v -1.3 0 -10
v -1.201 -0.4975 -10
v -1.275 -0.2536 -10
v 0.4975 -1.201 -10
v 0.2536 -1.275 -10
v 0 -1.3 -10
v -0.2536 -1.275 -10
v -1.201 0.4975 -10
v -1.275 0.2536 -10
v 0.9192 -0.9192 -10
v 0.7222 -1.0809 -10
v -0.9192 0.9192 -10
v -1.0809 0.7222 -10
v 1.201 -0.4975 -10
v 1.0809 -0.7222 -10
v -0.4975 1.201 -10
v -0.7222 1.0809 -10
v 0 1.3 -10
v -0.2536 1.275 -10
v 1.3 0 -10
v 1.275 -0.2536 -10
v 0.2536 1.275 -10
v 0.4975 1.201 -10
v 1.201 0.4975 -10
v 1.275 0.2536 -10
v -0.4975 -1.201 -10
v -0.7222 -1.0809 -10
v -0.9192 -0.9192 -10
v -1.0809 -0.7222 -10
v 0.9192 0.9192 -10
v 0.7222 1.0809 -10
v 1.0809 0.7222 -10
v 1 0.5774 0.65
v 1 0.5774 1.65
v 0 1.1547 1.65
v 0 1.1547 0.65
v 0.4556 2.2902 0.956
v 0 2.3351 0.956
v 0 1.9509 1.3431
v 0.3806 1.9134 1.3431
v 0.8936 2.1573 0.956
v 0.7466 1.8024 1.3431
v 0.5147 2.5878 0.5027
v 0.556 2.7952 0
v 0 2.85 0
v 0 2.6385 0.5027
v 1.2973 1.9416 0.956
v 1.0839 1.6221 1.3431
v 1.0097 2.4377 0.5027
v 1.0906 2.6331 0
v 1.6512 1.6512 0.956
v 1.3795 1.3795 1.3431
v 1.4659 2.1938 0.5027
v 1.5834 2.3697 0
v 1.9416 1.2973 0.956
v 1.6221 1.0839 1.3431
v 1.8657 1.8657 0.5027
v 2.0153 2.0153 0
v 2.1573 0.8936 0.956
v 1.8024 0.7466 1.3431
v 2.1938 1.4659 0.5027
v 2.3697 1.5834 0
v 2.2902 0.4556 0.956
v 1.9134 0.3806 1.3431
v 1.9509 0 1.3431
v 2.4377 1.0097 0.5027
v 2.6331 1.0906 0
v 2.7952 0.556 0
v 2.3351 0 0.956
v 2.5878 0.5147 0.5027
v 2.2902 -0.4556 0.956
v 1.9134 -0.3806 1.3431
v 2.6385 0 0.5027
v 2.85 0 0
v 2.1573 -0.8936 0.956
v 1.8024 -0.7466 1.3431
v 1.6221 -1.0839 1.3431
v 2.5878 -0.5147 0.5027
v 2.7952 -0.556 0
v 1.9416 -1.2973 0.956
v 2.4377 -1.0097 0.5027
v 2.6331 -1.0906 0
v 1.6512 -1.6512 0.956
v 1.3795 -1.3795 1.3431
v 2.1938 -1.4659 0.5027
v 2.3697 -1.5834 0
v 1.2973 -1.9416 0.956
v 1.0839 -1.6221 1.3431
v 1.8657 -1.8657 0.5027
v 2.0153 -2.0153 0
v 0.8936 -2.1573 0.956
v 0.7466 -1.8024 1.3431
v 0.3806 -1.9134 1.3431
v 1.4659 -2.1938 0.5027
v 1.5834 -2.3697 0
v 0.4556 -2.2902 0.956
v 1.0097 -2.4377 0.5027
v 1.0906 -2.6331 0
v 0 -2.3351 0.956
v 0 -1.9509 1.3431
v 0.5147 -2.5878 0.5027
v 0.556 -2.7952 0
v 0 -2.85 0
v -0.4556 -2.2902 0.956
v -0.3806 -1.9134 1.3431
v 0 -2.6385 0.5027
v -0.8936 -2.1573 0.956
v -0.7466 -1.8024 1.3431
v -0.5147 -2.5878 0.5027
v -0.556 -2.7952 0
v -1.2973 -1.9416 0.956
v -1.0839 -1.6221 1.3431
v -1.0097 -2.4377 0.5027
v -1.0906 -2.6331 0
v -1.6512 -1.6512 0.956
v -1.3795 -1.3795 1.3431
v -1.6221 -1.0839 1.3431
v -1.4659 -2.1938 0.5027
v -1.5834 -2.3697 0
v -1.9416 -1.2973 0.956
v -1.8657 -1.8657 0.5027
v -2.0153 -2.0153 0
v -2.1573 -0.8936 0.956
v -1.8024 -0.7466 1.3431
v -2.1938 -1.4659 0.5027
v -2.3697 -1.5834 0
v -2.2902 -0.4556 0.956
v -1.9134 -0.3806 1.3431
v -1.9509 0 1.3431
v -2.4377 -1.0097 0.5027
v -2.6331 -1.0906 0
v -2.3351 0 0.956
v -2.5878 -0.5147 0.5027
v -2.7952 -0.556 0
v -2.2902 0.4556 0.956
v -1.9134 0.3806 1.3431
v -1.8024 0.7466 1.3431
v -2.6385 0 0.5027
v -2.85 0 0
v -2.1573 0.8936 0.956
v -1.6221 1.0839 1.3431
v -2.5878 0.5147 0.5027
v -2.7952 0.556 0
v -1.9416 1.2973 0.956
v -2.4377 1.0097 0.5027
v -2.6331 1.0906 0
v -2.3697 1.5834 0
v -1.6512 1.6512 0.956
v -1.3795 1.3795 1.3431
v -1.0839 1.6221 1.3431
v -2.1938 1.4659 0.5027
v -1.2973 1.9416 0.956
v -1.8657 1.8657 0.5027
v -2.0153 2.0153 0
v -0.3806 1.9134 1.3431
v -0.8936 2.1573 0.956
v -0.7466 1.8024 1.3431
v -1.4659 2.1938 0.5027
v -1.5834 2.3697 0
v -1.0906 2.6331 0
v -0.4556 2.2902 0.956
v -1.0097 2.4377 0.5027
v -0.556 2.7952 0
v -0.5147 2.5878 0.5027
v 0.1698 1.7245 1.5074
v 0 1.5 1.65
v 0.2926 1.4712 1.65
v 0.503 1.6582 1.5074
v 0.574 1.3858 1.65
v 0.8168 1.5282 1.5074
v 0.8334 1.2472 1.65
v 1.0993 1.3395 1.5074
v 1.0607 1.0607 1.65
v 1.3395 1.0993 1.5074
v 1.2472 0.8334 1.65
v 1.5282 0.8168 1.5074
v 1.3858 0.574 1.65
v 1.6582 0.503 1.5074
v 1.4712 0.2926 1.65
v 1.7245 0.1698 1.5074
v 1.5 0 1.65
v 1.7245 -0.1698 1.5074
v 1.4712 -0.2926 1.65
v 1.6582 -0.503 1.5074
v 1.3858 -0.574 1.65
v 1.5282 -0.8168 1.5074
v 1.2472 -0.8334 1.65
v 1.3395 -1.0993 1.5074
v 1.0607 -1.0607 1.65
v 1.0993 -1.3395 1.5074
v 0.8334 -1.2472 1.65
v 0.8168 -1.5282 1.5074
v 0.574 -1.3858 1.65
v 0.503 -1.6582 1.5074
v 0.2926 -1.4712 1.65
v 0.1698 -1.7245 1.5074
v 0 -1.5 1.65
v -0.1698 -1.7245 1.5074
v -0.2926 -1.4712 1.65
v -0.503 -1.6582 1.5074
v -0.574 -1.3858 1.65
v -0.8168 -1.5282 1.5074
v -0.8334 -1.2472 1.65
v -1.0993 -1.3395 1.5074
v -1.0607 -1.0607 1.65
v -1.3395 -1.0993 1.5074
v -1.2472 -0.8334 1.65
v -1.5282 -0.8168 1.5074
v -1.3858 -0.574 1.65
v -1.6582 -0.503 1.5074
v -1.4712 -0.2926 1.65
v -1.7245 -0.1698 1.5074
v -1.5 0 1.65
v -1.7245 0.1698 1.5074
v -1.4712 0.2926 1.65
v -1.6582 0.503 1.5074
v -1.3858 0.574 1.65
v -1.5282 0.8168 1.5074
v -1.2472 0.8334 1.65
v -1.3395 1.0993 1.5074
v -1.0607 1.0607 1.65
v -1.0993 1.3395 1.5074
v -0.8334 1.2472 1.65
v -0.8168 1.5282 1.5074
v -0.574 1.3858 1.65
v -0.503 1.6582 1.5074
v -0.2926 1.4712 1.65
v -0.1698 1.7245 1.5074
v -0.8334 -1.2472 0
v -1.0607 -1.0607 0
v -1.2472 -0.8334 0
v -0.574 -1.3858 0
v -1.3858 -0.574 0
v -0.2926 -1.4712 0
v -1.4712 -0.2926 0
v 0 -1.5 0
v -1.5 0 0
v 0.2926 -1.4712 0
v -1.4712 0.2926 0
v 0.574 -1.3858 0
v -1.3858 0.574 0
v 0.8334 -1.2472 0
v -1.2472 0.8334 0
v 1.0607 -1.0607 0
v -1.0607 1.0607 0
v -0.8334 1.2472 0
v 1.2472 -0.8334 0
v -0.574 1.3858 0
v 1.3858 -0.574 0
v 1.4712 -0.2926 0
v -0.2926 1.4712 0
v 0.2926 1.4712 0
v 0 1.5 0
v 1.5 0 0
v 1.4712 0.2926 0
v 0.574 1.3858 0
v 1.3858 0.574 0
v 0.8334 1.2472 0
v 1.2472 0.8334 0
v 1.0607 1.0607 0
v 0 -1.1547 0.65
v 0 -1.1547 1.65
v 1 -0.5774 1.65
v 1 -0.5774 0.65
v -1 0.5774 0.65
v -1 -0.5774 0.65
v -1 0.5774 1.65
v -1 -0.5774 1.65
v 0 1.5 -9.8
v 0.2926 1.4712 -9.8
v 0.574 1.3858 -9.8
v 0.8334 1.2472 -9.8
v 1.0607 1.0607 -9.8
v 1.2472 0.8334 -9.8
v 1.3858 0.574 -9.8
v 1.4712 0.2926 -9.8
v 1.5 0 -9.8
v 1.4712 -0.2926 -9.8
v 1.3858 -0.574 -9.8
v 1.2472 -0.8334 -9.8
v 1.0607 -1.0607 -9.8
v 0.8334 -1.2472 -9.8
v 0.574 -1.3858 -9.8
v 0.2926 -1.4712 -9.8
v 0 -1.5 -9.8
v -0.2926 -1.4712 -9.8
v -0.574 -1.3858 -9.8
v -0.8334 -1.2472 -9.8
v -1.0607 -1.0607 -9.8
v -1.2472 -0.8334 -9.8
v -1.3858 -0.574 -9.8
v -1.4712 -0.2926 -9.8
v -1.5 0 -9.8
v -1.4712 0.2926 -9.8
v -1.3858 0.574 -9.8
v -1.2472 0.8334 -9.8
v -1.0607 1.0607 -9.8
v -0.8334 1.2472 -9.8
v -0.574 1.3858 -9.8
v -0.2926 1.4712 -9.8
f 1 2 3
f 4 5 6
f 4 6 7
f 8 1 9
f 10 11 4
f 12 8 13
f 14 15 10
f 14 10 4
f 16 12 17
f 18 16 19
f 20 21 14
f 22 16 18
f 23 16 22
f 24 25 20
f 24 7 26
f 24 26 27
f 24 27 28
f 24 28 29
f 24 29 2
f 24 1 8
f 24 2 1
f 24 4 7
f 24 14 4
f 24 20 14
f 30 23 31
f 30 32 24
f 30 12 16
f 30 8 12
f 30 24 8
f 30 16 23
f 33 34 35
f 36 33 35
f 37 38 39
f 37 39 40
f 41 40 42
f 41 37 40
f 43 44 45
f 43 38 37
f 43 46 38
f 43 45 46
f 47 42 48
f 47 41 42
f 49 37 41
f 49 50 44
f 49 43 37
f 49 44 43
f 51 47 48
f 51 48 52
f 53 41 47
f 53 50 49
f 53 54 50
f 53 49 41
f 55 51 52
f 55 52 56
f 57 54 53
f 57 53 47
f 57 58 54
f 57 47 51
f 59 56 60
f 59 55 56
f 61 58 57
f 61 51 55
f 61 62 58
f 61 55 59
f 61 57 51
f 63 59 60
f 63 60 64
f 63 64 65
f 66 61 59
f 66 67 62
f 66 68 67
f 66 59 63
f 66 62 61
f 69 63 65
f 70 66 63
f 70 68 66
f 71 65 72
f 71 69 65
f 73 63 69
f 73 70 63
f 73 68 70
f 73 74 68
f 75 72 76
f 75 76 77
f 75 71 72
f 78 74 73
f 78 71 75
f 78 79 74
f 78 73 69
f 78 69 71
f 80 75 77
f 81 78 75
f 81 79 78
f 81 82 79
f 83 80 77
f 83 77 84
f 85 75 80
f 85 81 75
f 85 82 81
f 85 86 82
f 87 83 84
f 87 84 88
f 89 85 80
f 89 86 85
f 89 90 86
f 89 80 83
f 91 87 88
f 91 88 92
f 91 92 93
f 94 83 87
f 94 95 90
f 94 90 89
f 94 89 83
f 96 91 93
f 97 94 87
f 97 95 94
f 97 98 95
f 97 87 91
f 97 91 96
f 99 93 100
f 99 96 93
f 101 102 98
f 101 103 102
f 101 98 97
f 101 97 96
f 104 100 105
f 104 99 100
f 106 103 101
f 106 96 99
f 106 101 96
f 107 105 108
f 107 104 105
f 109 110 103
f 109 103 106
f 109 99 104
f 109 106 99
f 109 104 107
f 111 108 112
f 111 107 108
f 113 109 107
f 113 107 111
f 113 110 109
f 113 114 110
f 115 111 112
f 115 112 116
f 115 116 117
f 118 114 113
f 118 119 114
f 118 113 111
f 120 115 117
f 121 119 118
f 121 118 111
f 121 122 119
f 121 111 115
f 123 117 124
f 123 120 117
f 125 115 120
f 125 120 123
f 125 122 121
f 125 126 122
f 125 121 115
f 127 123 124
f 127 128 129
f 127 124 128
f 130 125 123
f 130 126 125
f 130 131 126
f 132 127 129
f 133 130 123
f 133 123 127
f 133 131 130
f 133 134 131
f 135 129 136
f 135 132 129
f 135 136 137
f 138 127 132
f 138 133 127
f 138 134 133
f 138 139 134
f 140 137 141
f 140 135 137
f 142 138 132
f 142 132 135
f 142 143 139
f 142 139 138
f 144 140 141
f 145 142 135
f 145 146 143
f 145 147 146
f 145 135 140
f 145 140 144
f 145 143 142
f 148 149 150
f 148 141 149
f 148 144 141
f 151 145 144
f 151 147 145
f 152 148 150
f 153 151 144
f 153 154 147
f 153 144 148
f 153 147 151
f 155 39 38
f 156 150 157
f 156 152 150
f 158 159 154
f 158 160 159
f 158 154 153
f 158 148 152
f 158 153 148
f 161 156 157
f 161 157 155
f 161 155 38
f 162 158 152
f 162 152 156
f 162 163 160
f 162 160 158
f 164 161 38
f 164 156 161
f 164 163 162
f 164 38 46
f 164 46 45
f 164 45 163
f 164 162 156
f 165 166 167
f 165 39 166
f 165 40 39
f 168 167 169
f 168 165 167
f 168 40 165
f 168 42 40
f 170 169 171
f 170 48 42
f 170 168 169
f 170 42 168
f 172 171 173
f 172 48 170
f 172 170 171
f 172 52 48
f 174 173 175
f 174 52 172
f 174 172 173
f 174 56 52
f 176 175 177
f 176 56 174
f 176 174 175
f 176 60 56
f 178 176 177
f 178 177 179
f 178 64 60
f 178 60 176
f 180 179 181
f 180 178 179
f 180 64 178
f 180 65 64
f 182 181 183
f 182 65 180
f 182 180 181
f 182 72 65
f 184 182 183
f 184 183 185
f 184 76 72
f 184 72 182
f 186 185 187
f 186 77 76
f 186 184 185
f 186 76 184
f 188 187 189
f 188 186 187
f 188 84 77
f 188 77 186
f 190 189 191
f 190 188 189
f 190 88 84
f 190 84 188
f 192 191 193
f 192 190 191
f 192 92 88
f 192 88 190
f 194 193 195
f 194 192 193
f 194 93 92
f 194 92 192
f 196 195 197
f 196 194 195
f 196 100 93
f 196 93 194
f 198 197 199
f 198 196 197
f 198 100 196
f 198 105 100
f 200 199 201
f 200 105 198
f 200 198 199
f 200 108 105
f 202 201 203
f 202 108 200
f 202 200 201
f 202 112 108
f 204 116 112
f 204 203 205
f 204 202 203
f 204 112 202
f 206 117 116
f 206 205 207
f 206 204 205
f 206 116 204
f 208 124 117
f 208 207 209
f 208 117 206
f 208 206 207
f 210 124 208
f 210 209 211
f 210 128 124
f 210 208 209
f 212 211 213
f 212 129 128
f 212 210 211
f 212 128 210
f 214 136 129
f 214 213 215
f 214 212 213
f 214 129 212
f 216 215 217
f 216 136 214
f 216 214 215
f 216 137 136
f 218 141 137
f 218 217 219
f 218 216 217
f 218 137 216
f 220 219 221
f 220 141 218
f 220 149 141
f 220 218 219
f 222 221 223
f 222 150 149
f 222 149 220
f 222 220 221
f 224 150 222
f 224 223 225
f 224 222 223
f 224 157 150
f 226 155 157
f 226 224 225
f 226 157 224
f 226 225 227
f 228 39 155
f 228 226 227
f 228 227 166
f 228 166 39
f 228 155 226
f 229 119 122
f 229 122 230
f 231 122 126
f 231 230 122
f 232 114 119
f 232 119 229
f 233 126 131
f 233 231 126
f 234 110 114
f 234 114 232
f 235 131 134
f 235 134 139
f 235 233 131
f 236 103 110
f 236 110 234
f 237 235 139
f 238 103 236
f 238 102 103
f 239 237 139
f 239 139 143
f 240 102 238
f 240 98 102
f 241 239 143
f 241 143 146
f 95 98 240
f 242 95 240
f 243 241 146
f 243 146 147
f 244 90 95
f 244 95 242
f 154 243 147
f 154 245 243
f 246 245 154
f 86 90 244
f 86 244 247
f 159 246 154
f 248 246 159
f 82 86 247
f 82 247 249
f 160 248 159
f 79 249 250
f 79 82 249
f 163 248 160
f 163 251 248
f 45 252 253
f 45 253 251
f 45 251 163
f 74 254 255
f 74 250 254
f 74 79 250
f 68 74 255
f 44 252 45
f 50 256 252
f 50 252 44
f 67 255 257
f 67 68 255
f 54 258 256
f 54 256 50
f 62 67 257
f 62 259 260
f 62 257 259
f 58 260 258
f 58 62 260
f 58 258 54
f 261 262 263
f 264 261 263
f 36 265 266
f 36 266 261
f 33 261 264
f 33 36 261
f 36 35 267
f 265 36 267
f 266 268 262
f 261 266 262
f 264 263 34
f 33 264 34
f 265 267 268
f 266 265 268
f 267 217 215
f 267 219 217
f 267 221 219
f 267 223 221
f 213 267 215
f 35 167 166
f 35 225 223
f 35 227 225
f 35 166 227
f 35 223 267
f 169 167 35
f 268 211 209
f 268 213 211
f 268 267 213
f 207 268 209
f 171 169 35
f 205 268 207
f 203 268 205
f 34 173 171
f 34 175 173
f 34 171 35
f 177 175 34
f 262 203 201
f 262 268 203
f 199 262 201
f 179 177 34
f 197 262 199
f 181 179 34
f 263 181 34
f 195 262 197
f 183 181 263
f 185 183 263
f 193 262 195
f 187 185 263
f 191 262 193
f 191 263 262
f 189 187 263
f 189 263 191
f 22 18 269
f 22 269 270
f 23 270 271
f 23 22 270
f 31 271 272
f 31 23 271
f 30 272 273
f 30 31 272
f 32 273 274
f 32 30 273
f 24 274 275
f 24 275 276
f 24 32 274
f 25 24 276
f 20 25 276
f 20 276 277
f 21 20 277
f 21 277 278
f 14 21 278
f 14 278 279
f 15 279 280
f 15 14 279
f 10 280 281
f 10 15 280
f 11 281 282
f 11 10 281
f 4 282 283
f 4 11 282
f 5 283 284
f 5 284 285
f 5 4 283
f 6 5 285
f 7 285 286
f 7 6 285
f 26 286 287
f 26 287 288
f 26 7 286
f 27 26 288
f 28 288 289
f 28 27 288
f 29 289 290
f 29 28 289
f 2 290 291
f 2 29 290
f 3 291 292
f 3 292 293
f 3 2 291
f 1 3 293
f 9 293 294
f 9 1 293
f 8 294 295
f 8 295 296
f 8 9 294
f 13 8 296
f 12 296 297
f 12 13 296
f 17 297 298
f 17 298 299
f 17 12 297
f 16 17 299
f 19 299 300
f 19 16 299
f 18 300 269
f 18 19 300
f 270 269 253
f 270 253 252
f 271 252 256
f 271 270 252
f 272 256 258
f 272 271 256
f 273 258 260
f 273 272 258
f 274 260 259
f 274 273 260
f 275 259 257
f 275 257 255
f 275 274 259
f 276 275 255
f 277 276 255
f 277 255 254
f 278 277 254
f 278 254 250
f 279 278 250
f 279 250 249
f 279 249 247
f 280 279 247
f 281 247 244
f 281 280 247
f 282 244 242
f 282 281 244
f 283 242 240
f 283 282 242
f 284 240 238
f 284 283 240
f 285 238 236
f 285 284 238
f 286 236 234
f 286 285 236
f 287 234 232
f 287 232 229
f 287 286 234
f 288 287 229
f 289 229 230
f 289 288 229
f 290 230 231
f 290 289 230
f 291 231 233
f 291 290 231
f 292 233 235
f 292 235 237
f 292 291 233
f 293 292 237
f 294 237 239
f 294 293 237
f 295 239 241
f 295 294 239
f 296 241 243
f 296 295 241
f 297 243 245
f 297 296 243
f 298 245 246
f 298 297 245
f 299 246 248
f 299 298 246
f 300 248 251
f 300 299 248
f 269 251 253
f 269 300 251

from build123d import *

# Parameters (mm, degrees)
CORTAR_EXTRUIR2_DEPTH = 1
CHAFL_N1_SIZE         = 0.2


with BuildPart() as part:
    # Croquis1 → Revolución1 (revolve)
    with BuildSketch(Plane(origin=(0, 0, 0), x_dir=(0, 0, -1), z_dir=(1, 0, 0))):
        with BuildLine():
            Line((0, 2.85), (0, 1.5))
            Line((0, 1.5), (10, 1.5))
            Line((10, 1.5), (10, 0))
            Line((10, 0), (-1.65, 0))
            Line((-1.65, 0), (-1.65, 1.5))
            ThreePointArc((-1.65, 1.5), (-0.955984269, 2.335091885), (0, 2.85))
        make_face()
    revolve(axis=Axis((0, 0, -10), (0, 0, -1)))

    # Croquis2 → Cortar-Extruir2 (cut)
    with BuildSketch(Plane.XY.offset(1.65)):
        Polygon((0, 1.154700538), (-1, 0.577350269), (-1, -0.577350269), (0, -1.154700538), (1, -0.577350269), (1, 0.577350269), align=None)
    extrude(amount=-CORTAR_EXTRUIR2_DEPTH, mode=Mode.SUBTRACT)

    # Chaflán1
    chafl_n1_edges = [part.edges().sort_by_distance(p)[0] for p in [
        (0, -1.5, -10),
    ]]
    chamfer(chafl_n1_edges, length=CHAFL_N1_SIZE)


solid = part.part
